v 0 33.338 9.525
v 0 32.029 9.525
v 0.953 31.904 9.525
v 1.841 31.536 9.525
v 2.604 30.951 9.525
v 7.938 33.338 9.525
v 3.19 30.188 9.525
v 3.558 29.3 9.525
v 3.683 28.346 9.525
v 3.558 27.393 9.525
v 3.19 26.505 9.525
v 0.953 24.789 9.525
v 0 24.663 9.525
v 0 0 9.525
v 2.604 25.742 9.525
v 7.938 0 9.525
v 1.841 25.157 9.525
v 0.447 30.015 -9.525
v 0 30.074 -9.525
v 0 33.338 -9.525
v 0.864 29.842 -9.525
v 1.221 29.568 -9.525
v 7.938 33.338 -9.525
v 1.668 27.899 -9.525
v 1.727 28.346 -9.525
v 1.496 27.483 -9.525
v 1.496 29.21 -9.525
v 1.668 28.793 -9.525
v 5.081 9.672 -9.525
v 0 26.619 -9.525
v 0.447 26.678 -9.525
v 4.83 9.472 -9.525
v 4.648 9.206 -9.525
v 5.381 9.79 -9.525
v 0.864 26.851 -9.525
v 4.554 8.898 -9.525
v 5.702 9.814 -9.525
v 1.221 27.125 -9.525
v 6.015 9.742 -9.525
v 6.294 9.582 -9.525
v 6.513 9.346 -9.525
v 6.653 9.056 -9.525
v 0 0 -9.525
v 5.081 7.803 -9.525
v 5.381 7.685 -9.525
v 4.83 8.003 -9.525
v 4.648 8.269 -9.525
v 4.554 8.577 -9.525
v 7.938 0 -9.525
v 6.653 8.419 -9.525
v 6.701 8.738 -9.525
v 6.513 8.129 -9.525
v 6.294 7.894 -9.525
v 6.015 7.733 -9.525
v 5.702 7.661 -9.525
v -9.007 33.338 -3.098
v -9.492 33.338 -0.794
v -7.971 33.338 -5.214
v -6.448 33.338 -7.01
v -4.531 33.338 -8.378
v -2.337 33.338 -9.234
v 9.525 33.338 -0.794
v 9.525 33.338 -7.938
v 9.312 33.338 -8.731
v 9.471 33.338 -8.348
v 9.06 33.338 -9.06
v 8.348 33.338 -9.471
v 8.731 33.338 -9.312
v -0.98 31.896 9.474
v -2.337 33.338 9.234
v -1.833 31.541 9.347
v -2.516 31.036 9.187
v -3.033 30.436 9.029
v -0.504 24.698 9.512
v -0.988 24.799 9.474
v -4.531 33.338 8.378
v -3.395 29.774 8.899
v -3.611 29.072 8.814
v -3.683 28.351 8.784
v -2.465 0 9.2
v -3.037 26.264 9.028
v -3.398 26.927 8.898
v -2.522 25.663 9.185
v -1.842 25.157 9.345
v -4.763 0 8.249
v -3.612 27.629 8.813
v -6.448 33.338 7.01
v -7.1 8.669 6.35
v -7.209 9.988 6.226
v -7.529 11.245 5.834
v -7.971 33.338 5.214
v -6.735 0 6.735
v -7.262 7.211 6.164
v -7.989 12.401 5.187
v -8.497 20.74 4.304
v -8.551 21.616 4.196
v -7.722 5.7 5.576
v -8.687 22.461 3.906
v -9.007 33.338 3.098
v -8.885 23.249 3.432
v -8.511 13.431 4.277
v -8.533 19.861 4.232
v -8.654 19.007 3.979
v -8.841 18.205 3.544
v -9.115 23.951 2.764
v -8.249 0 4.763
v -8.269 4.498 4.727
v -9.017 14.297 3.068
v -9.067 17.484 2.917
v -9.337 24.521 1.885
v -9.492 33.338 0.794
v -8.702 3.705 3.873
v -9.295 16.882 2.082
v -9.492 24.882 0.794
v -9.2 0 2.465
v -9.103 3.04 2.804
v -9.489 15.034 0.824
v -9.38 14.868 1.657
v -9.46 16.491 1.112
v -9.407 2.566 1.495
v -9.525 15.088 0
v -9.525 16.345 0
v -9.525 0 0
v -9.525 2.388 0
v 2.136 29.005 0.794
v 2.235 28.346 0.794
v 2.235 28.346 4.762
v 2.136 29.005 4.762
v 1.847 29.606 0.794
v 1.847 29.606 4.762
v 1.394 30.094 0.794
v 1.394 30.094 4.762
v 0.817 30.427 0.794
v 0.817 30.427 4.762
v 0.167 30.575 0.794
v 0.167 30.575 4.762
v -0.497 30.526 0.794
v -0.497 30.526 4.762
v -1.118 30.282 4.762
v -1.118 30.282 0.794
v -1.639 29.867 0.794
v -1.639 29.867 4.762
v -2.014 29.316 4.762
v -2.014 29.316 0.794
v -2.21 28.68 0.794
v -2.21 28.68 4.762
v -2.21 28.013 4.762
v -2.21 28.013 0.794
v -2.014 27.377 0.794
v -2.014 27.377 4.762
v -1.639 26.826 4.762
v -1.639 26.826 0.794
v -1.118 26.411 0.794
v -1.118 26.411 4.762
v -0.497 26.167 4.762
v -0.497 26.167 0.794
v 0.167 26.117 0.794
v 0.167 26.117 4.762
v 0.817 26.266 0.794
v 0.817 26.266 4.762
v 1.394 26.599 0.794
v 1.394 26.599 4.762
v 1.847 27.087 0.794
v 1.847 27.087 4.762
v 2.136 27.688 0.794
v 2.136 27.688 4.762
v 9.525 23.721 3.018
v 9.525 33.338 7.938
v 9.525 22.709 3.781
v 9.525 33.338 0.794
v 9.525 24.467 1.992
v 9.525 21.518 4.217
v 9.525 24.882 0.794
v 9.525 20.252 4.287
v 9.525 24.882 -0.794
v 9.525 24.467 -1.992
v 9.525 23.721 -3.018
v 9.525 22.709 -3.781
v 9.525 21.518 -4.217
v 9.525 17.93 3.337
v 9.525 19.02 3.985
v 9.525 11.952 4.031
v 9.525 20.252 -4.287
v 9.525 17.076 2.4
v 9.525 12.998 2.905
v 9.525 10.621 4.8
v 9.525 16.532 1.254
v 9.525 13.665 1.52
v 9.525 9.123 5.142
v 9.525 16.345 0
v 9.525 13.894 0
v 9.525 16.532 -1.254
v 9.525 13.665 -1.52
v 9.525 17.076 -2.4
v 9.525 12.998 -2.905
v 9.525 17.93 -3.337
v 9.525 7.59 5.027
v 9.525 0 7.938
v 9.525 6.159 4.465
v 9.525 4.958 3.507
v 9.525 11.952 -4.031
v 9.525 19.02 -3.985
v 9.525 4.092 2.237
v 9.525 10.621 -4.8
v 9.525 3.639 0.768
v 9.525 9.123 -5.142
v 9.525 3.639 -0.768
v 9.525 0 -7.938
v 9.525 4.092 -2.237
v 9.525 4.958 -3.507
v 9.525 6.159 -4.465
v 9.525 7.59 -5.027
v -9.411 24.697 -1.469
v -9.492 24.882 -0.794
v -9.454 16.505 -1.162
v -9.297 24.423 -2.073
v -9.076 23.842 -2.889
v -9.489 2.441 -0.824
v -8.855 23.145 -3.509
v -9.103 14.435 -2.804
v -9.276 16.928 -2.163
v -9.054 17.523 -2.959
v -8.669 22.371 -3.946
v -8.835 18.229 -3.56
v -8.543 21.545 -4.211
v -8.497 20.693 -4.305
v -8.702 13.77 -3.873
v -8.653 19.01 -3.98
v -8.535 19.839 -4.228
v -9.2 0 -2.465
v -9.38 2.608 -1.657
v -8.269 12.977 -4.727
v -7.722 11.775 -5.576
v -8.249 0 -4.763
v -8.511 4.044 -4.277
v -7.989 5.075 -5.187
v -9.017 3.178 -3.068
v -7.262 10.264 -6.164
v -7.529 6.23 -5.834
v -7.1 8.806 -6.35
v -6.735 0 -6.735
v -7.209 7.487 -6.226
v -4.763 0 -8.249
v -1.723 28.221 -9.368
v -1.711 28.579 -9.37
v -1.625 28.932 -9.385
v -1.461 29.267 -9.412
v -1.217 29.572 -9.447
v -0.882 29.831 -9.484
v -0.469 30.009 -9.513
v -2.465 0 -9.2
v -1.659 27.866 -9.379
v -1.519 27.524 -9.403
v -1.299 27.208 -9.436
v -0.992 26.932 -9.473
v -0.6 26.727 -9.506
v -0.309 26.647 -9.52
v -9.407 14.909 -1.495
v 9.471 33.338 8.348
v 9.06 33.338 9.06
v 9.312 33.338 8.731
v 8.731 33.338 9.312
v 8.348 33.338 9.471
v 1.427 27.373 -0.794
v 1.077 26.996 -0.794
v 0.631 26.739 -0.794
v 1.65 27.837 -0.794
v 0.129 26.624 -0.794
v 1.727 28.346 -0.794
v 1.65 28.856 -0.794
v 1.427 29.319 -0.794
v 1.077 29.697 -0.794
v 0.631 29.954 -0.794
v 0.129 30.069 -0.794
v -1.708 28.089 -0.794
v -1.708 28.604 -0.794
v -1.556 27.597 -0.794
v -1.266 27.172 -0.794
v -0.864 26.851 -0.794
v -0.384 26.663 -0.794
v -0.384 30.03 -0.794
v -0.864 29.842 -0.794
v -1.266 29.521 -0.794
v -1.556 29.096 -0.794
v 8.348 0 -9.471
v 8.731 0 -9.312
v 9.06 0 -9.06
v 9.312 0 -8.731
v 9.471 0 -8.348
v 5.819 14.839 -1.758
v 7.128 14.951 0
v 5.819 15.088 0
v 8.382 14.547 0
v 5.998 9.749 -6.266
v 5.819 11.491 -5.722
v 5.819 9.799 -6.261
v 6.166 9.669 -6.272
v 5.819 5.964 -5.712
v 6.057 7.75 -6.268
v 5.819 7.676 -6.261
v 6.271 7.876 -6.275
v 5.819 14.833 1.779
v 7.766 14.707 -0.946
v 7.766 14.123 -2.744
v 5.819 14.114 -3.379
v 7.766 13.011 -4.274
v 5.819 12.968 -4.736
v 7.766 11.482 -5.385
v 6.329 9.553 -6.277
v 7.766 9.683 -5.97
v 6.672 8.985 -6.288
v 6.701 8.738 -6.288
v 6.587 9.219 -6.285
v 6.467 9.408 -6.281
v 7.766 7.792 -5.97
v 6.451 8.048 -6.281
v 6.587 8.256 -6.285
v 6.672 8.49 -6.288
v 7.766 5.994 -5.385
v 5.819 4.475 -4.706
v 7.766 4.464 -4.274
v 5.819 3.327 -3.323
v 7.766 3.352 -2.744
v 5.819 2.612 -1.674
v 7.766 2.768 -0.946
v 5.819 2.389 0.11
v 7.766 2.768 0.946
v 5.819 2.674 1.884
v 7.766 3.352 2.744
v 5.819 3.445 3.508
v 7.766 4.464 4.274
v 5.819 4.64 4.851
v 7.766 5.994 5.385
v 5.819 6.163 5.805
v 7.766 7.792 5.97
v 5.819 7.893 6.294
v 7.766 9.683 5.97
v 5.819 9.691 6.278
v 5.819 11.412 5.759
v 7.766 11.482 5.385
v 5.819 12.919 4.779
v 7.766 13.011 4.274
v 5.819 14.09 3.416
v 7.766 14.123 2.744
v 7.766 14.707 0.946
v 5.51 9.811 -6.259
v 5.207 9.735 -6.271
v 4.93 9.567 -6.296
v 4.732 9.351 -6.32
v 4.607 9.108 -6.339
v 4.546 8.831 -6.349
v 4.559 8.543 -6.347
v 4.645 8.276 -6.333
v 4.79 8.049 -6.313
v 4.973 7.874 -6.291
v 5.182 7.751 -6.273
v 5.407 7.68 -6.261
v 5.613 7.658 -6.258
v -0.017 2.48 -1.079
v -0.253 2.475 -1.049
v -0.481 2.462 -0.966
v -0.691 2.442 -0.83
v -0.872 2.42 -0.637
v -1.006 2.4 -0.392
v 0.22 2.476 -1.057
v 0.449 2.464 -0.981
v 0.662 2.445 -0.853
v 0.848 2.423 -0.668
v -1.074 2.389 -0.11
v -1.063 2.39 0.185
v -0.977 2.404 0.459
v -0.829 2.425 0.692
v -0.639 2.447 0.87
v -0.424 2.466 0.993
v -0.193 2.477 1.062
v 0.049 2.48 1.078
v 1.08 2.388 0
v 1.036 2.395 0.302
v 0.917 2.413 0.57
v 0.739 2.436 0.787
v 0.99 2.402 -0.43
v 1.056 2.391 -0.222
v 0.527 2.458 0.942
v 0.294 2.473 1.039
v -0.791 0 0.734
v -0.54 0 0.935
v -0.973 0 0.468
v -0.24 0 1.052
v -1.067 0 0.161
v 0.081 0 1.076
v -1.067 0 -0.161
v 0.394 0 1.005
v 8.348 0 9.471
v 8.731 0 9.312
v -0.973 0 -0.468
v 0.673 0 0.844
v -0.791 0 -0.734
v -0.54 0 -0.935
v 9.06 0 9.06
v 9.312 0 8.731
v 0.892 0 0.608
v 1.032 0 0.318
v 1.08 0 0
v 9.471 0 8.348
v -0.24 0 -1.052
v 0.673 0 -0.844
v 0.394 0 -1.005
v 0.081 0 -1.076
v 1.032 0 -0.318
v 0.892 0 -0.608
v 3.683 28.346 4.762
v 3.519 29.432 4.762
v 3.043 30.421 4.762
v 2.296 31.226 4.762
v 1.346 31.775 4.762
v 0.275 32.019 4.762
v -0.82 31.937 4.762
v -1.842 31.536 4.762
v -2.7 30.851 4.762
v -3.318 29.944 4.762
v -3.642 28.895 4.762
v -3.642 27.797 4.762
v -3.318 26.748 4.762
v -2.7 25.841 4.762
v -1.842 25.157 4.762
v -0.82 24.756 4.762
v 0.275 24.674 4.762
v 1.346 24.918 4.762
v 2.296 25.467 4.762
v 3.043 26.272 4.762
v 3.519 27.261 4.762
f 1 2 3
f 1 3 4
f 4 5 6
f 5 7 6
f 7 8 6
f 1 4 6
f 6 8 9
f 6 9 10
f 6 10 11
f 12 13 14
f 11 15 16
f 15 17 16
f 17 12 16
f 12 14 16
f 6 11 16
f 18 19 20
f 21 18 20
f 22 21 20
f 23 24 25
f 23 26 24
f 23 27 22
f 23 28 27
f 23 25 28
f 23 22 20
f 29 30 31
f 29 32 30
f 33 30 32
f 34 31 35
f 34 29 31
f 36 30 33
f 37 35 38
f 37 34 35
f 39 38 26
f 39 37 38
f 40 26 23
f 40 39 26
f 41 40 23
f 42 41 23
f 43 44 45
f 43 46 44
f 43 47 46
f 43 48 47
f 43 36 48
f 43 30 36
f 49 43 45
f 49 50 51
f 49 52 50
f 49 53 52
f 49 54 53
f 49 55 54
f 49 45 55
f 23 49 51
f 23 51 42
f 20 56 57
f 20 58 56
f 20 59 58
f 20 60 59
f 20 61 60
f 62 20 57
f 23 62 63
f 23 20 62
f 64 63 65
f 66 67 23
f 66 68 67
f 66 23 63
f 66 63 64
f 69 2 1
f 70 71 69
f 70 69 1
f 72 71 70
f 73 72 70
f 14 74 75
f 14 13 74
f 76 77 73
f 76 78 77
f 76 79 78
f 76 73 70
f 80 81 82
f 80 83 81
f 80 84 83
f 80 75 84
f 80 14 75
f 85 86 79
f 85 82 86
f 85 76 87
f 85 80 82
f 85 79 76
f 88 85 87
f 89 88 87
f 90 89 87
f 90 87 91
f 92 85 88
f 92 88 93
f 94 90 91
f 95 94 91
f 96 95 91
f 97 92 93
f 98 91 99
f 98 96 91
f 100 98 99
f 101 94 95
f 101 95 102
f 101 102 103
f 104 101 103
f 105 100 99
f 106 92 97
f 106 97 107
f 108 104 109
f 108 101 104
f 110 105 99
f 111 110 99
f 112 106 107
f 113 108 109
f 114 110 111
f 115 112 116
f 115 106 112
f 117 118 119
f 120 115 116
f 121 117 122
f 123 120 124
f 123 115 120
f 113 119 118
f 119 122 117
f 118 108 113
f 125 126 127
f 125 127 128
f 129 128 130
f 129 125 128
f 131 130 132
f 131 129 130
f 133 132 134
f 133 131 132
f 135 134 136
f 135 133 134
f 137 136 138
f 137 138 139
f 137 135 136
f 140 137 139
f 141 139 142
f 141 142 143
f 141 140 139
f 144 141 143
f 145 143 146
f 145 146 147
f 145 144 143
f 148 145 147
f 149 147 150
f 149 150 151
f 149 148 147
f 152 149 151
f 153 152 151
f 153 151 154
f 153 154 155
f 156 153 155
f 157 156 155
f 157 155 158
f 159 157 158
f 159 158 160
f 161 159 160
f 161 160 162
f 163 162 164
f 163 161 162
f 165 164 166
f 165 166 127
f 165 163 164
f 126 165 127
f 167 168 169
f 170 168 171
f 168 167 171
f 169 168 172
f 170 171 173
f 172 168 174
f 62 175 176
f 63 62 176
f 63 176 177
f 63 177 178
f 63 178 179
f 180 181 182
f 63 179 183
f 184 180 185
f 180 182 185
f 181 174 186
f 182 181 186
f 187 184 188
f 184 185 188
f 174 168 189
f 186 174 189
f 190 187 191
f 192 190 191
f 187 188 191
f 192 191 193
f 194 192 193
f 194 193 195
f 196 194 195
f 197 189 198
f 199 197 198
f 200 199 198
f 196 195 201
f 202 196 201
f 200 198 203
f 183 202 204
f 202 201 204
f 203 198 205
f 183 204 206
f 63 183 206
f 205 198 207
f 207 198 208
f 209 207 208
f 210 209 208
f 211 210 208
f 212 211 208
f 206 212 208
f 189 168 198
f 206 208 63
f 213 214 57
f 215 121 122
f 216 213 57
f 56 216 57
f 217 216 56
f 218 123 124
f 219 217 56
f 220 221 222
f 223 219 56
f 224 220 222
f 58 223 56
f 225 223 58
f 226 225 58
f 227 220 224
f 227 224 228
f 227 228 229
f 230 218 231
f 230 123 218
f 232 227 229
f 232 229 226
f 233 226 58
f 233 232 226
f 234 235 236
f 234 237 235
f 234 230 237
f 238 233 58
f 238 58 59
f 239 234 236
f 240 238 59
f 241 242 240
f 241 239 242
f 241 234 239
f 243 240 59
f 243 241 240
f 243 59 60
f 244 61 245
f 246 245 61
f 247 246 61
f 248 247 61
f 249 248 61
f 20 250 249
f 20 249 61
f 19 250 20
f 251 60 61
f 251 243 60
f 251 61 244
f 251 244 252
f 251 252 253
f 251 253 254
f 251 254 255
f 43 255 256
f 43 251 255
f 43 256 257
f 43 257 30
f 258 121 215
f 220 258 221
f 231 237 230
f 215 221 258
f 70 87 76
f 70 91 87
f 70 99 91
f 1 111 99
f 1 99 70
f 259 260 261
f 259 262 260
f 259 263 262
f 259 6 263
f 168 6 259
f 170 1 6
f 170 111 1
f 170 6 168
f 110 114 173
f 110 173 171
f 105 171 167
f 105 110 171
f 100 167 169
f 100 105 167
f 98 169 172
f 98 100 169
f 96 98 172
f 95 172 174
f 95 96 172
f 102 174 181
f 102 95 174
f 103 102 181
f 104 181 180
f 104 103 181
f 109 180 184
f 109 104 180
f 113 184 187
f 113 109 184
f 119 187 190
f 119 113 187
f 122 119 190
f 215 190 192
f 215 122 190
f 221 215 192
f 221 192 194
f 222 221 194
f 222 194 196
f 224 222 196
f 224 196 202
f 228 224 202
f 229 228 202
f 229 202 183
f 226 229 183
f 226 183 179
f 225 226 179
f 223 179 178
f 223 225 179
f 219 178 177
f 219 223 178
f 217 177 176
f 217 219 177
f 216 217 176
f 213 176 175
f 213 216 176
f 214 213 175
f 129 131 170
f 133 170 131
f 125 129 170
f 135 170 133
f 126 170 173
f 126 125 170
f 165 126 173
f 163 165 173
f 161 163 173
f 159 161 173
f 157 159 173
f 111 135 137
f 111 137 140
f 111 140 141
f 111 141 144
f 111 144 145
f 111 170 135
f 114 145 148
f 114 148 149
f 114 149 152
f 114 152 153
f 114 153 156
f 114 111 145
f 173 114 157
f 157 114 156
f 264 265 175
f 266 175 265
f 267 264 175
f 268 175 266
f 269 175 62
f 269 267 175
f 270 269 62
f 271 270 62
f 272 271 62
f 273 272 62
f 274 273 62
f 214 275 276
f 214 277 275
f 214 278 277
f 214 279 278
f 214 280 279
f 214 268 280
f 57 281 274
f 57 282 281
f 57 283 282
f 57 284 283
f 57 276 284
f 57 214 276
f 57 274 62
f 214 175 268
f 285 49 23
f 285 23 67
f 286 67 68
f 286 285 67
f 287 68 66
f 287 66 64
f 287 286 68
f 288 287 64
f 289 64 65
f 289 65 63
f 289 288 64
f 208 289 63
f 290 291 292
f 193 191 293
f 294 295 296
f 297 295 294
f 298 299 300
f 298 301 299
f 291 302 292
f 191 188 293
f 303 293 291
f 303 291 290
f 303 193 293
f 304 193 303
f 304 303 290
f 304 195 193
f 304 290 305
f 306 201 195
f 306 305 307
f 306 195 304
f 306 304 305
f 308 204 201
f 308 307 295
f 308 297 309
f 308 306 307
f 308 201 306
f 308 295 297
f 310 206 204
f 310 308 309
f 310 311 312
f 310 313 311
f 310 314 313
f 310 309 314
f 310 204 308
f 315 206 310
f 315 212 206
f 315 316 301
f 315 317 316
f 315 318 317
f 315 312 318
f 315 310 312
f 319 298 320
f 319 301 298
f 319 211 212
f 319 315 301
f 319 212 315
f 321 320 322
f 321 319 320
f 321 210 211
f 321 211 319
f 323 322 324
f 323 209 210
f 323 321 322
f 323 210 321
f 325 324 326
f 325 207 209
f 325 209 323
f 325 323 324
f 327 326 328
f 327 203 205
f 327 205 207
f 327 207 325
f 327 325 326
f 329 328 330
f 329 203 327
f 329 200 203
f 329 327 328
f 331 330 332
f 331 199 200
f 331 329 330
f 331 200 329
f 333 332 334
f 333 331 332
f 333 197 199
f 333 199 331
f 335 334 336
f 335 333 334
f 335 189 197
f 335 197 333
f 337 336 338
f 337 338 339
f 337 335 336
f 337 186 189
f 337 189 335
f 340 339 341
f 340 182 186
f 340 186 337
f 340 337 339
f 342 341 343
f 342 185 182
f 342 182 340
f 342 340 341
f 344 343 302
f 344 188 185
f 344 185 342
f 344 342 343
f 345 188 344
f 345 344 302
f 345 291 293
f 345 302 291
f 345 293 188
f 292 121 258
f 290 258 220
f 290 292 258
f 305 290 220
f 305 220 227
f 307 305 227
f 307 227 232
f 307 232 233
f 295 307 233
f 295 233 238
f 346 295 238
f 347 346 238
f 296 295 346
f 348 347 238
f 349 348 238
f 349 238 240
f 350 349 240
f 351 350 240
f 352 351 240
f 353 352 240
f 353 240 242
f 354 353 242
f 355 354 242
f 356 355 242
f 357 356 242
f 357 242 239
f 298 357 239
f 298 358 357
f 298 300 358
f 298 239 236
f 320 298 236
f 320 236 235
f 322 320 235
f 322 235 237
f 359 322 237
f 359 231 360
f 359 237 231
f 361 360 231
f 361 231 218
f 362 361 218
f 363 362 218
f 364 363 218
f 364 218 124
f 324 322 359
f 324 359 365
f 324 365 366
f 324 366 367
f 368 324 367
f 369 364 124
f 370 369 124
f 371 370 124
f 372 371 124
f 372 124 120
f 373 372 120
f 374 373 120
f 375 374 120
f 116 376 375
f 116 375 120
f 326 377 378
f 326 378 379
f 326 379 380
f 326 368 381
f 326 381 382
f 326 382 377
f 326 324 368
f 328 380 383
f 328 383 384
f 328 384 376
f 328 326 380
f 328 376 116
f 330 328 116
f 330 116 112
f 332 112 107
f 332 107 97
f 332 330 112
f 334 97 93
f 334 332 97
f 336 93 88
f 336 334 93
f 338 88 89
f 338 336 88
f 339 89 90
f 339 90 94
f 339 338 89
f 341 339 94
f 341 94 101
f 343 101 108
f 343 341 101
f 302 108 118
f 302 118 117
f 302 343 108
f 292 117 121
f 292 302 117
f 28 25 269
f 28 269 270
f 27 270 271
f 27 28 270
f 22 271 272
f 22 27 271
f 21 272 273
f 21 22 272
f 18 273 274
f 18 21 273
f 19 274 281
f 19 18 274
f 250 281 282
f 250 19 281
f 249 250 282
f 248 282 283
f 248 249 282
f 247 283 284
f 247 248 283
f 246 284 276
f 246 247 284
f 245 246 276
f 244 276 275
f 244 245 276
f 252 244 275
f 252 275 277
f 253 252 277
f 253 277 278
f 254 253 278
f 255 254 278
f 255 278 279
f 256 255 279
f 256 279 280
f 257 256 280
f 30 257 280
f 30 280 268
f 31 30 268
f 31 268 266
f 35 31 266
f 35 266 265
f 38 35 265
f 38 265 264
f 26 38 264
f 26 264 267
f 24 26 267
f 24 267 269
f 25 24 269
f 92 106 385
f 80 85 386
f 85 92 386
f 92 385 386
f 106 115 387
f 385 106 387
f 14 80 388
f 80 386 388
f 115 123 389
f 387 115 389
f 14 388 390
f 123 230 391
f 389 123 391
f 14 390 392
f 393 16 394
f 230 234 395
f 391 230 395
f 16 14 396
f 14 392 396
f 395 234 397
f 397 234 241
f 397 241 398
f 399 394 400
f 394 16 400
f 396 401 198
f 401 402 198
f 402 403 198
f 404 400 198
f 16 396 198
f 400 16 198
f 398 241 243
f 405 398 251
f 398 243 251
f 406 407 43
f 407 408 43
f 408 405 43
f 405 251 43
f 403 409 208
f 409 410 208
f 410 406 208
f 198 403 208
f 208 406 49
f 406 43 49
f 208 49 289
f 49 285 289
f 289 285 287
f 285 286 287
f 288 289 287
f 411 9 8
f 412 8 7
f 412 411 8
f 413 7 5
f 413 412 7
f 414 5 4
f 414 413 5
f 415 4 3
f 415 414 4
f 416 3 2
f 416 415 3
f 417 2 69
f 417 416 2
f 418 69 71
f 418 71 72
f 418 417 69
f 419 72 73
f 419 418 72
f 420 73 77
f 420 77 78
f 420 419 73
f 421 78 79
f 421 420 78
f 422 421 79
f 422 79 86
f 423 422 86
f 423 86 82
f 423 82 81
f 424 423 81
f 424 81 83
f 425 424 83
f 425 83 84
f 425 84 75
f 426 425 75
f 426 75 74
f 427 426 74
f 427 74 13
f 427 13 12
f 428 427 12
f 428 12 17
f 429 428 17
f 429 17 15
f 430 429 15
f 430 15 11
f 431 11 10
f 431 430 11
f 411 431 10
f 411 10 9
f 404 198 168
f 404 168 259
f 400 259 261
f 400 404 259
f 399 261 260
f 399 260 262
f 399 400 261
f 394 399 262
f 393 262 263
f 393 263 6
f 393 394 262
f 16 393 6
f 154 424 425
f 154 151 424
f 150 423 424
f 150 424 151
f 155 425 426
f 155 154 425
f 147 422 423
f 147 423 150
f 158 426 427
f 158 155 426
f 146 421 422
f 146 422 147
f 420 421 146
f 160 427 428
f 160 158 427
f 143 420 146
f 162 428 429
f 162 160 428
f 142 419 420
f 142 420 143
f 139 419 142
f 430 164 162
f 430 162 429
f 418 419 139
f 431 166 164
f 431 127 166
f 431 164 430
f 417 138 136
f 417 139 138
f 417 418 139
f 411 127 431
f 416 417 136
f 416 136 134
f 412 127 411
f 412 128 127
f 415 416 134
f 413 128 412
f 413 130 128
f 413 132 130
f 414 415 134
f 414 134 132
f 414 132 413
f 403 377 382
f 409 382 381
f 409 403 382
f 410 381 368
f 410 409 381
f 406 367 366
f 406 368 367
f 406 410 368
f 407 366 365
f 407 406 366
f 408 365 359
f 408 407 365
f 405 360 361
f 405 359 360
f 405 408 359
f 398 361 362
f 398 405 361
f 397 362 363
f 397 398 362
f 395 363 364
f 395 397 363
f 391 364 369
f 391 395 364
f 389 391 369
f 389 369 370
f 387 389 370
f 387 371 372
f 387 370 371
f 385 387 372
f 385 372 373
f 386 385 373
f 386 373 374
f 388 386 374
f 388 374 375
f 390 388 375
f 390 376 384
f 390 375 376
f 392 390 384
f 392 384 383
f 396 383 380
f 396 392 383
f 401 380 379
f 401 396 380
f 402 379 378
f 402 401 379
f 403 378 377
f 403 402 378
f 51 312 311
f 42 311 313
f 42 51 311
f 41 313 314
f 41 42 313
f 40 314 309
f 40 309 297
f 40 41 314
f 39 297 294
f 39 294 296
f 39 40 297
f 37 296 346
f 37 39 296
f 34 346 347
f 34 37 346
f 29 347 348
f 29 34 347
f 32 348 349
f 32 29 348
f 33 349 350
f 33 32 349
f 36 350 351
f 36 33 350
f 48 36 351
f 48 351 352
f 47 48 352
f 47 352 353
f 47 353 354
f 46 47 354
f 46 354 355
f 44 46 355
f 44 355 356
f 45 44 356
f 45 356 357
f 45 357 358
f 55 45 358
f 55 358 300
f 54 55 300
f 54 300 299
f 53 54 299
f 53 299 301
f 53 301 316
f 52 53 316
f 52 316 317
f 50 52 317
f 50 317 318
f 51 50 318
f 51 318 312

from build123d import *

# Parameters (mm, degrees)
SKETCH1_W               = 19.05
SKETCH1_H               = 19.05
EXTRUDE1_DEPTH          = 33.3375
CUT_EXTRUDE1_DEPTH      = 36.956086498
CUT_EXTRUDE1_DEPTH_BACK = 36.956086498
SKETCH2_R               = 1.7272
FILLET1_START           = 4.7625
FILLET1_OUTLINE_R       = 3.683
FILLET1_OUTLINE_R_2     = 1.7272
FILLET1_DEPTH           = 6.2375
FILLET1_START_2         = -0.79375
FILLET1_2_OUTLINE_R     = 3.683
FILLET1_2_OUTLINE_R_2   = 1.7272
FILLET1_2_DEPTH         = 1.5875
FILLET1_START_3         = 0.79375
FILLET1_3_OUTLINE_R     = 2.2352
FILLET1_3_OUTLINE_R_2   = 1.7272
FILLET1_3_DEPTH         = 3.96875
FILLET1_START_4         = -11
FILLET1_4_OUTLINE_R     = 1.0795
FILLET1_4_DEPTH         = 6.6947
FILLET1_START_5         = -9.525
FILLET1_5_DEPTH         = 19.05
FILLET1_START_6         = 16.48139325
FILLET1_6_OUTLINE_W     = 19.05
FILLET1_6_OUTLINE_H     = 1.5875
FILLET1_6_DEPTH         = 16.85610675
FILLET1_7_DEPTH         = 29.81639325
FILLET1_8_OUTLINE_R     = 1.0795
FILLET1_8_DEPTH         = 2.480030305
SPLIT1_DEPTH            = 33.3375


with BuildPart() as part:
    # Sketch1 → Extrude1 (new body)
    with BuildSketch(Plane(origin=(0, 0, 0), x_dir=(1, 0, 0), z_dir=(0, 1, 0))):
        Rectangle(SKETCH1_W, SKETCH1_H)
    extrude(amount=EXTRUDE1_DEPTH)

    # Sketch2 → Cut-Extrude1 (cut, two sides: drawn at the far end of the back side and taken through both)
    with BuildSketch(Plane.XY.offset(-CUT_EXTRUDE1_DEPTH_BACK)):
        with Locations((0, 28.3464)):
            Circle(SKETCH2_R)
    extrude(amount=CUT_EXTRUDE1_DEPTH + CUT_EXTRUDE1_DEPTH_BACK, mode=Mode.SUBTRACT)


with BuildPart() as body_2:
    # Sketch3 → Revolve1 (revolve)
    with BuildSketch(Plane.XY):
        with BuildLine():
            Line((12.168775296, 8.7376), (-12.7, 8.7376))
            Line((-12.7, 8.7376), (-12.7, 15.0876))
            Line((-12.7, 15.0876), (5.818775296, 15.0876))
            ThreePointArc((5.818775296, 15.0876), (10.308903356, 13.227728061), (12.168775296, 8.7376))
        make_face()
    revolve(axis=Axis((12.168775296, 8.7376, 0), (-1, 0, 0)))


with BuildPart() as part_1:
    add(part.part)

    # Combine1: cut body 2
    add(body_2.part, mode=Mode.SUBTRACT)

    # Fillet1: read off the stored shape, not the designer's step
    # Fillet1 outline → Fillet1 (cut)
    with BuildSketch(Plane.XY.offset(FILLET1_START)):
        with Locations((0, 28.3464)):
            Circle(FILLET1_OUTLINE_R)
        with Locations((0, 28.3464)):
            Circle(FILLET1_OUTLINE_R_2, mode=Mode.SUBTRACT)
    extrude(amount=FILLET1_DEPTH, mode=Mode.SUBTRACT)

    # Fillet1 2 outline → Fillet1 2 (cut)
    with BuildSketch(Plane.XY.offset(FILLET1_START_2)):
        with Locations((0, 28.3464)):
            Circle(FILLET1_2_OUTLINE_R)
        with Locations((0, 28.3464)):
            Circle(FILLET1_2_OUTLINE_R_2, mode=Mode.SUBTRACT)
    extrude(amount=FILLET1_2_DEPTH, mode=Mode.SUBTRACT)

    # Fillet1 3 outline → Fillet1 3 (cut)
    with BuildSketch(Plane.XY.offset(FILLET1_START_3)):
        with Locations((0, 28.3464)):
            Circle(FILLET1_3_OUTLINE_R)
        with Locations((0, 28.3464)):
            Circle(FILLET1_3_OUTLINE_R_2, mode=Mode.SUBTRACT)
    extrude(amount=FILLET1_3_DEPTH, mode=Mode.SUBTRACT)

    # Fillet1 4 outline → Fillet1 4 (cut)
    with BuildSketch(Plane.XY.offset(FILLET1_START_4)):
        with Locations((5.62102, 8.7376)):
            Circle(FILLET1_4_OUTLINE_R)
    extrude(amount=FILLET1_4_DEPTH, mode=Mode.SUBTRACT)

    # Fillet1 5 outline → Fillet1 5 (cut)
    with BuildSketch(Plane.YZ.offset(FILLET1_START_5)):
        with BuildLine():
            Line((33.3375, 0.79375), (24.881697256, 0.79375))
            ThreePointArc((24.881697256, 0.79375), (16.3449, 0), (24.881697256, -0.79375))
            Line((24.881697256, -0.79375), (33.3375, -0.79375))
            Line((33.3375, -0.79375), (33.3375, 0.79375))
        make_face()
    extrude(amount=FILLET1_5_DEPTH, mode=Mode.SUBTRACT)

    # Fillet1 6 outline → Fillet1 6 (cut)
    with BuildSketch(Plane(origin=(0, 0, 0), x_dir=(1, 0, 0), z_dir=(0, 1, 0)).offset(FILLET1_START_6)):
        Rectangle(FILLET1_6_OUTLINE_W, FILLET1_6_OUTLINE_H)
        with BuildLine():
            ThreePointArc((7.9375, 9.525), (9.060032015, 9.060032015), (9.525, 7.9375))
            Line((9.525, 7.9375), (9.525, 9.525))
            Line((9.525, 9.525), (7.9375, 9.525))
        make_face()
        with BuildLine():
            Line((9.525, -9.525), (9.525, -7.9375))
            ThreePointArc((9.525, -7.9375), (9.060032015, -9.060032015), (7.9375, -9.525))
            Line((7.9375, -9.525), (9.525, -9.525))
        make_face()
    extrude(amount=FILLET1_6_DEPTH, mode=Mode.SUBTRACT)

    # Fillet1 7 outline → Fillet1 7 (cut)
    with BuildSketch(Plane(origin=(0, 0, 0), x_dir=(1, 0, 0), z_dir=(0, 1, 0))):
        with BuildLine():
            ThreePointArc((7.9375, 9.525), (9.060032015, 9.060032015), (9.525, 7.9375))
            Line((9.525, 7.9375), (9.525, 9.525))
            Line((9.525, 9.525), (7.9375, 9.525))
        make_face()
        with BuildLine():
            Line((9.525, -9.525), (9.525, -7.9375))
            ThreePointArc((9.525, -7.9375), (9.060032015, -9.060032015), (7.9375, -9.525))
            Line((7.9375, -9.525), (9.525, -9.525))
        make_face()
    extrude(amount=FILLET1_7_DEPTH, mode=Mode.SUBTRACT)

    # Fillet1 8 outline → Fillet1 8 (cut)
    with BuildSketch(Plane(origin=(0, 0, 0), x_dir=(1, 0, 0), z_dir=(0, 1, 0))):
        Circle(FILLET1_8_OUTLINE_R)
    extrude(amount=FILLET1_8_DEPTH, mode=Mode.SUBTRACT)

    # Split1: read off the stored shape, not the designer's step
    # Split1 outline → Split1 (cut)
    with BuildSketch(Plane(origin=(0, 0, 0), x_dir=(1, 0, 0), z_dir=(0, 1, 0))):
        with BuildLine():
            Line((-9.525, 9.525), (-9.525, 0))
            ThreePointArc((-9.525, 0), (-6.735192091, 6.735192091), (0, 9.525))
            Line((0, 9.525), (-9.525, 9.525))
        make_face()
        with BuildLine():
            ThreePointArc((0, -9.525), (-6.735192091, -6.735192091), (-9.525, 0))
            Line((-9.525, 0), (-9.525, -9.525))
            Line((-9.525, -9.525), (0, -9.525))
        make_face()
    extrude(amount=SPLIT1_DEPTH, mode=Mode.SUBTRACT)


solid = part_1.part
